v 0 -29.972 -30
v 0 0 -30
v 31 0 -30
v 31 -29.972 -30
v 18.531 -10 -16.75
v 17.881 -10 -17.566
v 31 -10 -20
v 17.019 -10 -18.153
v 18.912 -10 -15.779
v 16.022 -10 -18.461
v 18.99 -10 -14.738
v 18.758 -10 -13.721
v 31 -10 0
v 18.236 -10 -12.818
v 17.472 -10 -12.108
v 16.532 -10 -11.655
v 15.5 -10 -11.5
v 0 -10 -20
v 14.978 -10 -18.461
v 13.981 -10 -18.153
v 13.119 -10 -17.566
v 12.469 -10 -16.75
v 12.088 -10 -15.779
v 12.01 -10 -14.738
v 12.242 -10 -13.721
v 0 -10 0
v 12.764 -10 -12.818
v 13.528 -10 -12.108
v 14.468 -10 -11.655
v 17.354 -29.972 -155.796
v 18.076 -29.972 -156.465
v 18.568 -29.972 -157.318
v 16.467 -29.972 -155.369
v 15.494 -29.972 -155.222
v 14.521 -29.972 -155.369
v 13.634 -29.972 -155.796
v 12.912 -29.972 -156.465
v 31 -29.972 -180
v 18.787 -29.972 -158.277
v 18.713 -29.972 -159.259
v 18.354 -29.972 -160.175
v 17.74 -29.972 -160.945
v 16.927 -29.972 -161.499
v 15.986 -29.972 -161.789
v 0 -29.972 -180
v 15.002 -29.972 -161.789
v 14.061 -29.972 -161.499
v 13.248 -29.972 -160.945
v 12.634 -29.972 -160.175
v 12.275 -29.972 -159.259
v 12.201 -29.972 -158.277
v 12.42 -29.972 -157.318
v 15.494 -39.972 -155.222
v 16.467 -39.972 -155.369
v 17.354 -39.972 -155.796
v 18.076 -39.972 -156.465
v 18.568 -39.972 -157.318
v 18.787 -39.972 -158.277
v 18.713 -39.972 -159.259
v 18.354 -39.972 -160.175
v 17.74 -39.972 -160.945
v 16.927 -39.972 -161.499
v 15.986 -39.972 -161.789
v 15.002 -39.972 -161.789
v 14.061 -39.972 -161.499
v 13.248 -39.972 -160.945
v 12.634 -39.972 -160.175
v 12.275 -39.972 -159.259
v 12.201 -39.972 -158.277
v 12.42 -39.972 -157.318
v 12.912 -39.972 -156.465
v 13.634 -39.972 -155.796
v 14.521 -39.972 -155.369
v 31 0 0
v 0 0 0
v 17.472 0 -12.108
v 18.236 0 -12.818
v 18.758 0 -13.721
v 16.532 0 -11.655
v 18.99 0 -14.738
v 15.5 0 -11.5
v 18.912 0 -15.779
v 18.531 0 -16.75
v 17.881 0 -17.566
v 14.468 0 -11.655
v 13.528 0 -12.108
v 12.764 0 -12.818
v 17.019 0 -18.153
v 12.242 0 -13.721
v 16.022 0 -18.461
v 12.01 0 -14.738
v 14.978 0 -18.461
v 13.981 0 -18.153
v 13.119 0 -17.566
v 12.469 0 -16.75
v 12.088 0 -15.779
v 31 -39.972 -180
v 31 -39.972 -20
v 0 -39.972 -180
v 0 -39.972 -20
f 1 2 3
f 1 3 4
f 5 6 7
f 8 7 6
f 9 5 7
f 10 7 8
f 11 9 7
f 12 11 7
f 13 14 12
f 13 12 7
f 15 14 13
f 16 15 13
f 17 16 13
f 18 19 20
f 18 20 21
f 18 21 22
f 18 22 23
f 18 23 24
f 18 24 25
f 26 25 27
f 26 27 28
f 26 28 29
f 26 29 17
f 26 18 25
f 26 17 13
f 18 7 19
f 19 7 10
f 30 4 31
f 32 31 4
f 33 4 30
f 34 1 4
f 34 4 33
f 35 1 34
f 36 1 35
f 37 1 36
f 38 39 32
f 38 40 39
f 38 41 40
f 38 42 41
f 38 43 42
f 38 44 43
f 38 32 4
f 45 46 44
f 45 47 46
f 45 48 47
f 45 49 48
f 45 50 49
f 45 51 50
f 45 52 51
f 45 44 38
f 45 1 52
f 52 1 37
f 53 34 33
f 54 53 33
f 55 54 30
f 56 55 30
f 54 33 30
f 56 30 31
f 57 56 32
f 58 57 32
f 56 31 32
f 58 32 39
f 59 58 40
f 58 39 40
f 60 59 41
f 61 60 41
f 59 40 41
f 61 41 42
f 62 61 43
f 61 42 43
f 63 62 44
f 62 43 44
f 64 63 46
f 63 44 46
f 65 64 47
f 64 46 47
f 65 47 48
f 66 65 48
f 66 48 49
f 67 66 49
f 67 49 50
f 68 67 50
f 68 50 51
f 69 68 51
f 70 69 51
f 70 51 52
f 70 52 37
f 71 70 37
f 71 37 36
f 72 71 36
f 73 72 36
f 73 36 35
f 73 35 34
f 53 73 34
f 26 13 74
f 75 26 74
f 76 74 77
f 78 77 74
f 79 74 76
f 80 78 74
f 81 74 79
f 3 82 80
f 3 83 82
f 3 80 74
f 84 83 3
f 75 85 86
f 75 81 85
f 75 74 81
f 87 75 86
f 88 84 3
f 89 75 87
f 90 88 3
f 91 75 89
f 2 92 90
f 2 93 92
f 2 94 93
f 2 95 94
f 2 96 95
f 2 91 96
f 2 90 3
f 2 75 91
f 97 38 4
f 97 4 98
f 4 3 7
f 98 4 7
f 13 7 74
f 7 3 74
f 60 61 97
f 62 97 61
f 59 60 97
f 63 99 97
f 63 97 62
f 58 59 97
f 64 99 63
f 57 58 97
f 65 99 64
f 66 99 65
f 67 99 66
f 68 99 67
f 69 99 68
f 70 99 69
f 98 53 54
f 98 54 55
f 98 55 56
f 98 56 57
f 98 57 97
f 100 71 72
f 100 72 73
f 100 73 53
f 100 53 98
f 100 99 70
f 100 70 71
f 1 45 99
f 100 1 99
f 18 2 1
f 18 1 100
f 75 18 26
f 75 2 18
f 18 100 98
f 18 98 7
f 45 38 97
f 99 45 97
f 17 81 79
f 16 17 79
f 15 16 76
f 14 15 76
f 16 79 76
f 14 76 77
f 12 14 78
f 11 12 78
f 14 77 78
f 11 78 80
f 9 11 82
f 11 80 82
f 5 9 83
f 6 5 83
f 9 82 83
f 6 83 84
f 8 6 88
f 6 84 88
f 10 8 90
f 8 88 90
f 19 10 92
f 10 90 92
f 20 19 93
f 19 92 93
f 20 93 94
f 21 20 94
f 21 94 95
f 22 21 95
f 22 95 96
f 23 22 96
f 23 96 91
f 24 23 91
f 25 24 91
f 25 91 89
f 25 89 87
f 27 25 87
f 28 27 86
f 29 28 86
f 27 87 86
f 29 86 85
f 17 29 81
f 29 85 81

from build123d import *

# Parameters (mm, degrees)
EXTRUDE_THIN1_DEPTH = 31
SKETCH6_R           = 3.5
CUT_EXTRUDE1_DEPTH  = 10
SKETCH7_R           = 3.302
CUT_EXTRUDE3_DEPTH  = 10.16


with BuildPart() as part:
    # Sketch1 → Extrude-Thin1 (new body)
    with BuildSketch(Plane(origin=(0, 0, 0), x_dir=(0, 0, -1), z_dir=(1, 0, 0))):
        Polygon((0, 0), (30, 0), (30, -29.972), (180, -29.972), (180, -39.972), (20, -39.972), (20, -10), (0, -10), align=None)
    extrude(amount=EXTRUDE_THIN1_DEPTH)

    # Sketch6 → Cut-Extrude1 (cut)
    with BuildSketch(Plane(origin=(0, 0, 0), x_dir=(1, 0, 0), z_dir=(0, 1, 0))):
        with Locations(Location((15.5, 15, 0), (0, 0, 270))):
            Circle(SKETCH6_R)
    extrude(amount=-CUT_EXTRUDE1_DEPTH, mode=Mode.SUBTRACT)

    # Sketch7 → Cut-Extrude3 (cut)
    with BuildSketch(Plane(origin=(0, -29.972, 0), x_dir=(1, 0, 0), z_dir=(0, 1, 0))):
        with Locations(Location((15.494, 158.524, 0), (0, 0, 270))):
            Circle(SKETCH7_R)
    extrude(amount=-CUT_EXTRUDE3_DEPTH, mode=Mode.SUBTRACT)


solid = part.part
